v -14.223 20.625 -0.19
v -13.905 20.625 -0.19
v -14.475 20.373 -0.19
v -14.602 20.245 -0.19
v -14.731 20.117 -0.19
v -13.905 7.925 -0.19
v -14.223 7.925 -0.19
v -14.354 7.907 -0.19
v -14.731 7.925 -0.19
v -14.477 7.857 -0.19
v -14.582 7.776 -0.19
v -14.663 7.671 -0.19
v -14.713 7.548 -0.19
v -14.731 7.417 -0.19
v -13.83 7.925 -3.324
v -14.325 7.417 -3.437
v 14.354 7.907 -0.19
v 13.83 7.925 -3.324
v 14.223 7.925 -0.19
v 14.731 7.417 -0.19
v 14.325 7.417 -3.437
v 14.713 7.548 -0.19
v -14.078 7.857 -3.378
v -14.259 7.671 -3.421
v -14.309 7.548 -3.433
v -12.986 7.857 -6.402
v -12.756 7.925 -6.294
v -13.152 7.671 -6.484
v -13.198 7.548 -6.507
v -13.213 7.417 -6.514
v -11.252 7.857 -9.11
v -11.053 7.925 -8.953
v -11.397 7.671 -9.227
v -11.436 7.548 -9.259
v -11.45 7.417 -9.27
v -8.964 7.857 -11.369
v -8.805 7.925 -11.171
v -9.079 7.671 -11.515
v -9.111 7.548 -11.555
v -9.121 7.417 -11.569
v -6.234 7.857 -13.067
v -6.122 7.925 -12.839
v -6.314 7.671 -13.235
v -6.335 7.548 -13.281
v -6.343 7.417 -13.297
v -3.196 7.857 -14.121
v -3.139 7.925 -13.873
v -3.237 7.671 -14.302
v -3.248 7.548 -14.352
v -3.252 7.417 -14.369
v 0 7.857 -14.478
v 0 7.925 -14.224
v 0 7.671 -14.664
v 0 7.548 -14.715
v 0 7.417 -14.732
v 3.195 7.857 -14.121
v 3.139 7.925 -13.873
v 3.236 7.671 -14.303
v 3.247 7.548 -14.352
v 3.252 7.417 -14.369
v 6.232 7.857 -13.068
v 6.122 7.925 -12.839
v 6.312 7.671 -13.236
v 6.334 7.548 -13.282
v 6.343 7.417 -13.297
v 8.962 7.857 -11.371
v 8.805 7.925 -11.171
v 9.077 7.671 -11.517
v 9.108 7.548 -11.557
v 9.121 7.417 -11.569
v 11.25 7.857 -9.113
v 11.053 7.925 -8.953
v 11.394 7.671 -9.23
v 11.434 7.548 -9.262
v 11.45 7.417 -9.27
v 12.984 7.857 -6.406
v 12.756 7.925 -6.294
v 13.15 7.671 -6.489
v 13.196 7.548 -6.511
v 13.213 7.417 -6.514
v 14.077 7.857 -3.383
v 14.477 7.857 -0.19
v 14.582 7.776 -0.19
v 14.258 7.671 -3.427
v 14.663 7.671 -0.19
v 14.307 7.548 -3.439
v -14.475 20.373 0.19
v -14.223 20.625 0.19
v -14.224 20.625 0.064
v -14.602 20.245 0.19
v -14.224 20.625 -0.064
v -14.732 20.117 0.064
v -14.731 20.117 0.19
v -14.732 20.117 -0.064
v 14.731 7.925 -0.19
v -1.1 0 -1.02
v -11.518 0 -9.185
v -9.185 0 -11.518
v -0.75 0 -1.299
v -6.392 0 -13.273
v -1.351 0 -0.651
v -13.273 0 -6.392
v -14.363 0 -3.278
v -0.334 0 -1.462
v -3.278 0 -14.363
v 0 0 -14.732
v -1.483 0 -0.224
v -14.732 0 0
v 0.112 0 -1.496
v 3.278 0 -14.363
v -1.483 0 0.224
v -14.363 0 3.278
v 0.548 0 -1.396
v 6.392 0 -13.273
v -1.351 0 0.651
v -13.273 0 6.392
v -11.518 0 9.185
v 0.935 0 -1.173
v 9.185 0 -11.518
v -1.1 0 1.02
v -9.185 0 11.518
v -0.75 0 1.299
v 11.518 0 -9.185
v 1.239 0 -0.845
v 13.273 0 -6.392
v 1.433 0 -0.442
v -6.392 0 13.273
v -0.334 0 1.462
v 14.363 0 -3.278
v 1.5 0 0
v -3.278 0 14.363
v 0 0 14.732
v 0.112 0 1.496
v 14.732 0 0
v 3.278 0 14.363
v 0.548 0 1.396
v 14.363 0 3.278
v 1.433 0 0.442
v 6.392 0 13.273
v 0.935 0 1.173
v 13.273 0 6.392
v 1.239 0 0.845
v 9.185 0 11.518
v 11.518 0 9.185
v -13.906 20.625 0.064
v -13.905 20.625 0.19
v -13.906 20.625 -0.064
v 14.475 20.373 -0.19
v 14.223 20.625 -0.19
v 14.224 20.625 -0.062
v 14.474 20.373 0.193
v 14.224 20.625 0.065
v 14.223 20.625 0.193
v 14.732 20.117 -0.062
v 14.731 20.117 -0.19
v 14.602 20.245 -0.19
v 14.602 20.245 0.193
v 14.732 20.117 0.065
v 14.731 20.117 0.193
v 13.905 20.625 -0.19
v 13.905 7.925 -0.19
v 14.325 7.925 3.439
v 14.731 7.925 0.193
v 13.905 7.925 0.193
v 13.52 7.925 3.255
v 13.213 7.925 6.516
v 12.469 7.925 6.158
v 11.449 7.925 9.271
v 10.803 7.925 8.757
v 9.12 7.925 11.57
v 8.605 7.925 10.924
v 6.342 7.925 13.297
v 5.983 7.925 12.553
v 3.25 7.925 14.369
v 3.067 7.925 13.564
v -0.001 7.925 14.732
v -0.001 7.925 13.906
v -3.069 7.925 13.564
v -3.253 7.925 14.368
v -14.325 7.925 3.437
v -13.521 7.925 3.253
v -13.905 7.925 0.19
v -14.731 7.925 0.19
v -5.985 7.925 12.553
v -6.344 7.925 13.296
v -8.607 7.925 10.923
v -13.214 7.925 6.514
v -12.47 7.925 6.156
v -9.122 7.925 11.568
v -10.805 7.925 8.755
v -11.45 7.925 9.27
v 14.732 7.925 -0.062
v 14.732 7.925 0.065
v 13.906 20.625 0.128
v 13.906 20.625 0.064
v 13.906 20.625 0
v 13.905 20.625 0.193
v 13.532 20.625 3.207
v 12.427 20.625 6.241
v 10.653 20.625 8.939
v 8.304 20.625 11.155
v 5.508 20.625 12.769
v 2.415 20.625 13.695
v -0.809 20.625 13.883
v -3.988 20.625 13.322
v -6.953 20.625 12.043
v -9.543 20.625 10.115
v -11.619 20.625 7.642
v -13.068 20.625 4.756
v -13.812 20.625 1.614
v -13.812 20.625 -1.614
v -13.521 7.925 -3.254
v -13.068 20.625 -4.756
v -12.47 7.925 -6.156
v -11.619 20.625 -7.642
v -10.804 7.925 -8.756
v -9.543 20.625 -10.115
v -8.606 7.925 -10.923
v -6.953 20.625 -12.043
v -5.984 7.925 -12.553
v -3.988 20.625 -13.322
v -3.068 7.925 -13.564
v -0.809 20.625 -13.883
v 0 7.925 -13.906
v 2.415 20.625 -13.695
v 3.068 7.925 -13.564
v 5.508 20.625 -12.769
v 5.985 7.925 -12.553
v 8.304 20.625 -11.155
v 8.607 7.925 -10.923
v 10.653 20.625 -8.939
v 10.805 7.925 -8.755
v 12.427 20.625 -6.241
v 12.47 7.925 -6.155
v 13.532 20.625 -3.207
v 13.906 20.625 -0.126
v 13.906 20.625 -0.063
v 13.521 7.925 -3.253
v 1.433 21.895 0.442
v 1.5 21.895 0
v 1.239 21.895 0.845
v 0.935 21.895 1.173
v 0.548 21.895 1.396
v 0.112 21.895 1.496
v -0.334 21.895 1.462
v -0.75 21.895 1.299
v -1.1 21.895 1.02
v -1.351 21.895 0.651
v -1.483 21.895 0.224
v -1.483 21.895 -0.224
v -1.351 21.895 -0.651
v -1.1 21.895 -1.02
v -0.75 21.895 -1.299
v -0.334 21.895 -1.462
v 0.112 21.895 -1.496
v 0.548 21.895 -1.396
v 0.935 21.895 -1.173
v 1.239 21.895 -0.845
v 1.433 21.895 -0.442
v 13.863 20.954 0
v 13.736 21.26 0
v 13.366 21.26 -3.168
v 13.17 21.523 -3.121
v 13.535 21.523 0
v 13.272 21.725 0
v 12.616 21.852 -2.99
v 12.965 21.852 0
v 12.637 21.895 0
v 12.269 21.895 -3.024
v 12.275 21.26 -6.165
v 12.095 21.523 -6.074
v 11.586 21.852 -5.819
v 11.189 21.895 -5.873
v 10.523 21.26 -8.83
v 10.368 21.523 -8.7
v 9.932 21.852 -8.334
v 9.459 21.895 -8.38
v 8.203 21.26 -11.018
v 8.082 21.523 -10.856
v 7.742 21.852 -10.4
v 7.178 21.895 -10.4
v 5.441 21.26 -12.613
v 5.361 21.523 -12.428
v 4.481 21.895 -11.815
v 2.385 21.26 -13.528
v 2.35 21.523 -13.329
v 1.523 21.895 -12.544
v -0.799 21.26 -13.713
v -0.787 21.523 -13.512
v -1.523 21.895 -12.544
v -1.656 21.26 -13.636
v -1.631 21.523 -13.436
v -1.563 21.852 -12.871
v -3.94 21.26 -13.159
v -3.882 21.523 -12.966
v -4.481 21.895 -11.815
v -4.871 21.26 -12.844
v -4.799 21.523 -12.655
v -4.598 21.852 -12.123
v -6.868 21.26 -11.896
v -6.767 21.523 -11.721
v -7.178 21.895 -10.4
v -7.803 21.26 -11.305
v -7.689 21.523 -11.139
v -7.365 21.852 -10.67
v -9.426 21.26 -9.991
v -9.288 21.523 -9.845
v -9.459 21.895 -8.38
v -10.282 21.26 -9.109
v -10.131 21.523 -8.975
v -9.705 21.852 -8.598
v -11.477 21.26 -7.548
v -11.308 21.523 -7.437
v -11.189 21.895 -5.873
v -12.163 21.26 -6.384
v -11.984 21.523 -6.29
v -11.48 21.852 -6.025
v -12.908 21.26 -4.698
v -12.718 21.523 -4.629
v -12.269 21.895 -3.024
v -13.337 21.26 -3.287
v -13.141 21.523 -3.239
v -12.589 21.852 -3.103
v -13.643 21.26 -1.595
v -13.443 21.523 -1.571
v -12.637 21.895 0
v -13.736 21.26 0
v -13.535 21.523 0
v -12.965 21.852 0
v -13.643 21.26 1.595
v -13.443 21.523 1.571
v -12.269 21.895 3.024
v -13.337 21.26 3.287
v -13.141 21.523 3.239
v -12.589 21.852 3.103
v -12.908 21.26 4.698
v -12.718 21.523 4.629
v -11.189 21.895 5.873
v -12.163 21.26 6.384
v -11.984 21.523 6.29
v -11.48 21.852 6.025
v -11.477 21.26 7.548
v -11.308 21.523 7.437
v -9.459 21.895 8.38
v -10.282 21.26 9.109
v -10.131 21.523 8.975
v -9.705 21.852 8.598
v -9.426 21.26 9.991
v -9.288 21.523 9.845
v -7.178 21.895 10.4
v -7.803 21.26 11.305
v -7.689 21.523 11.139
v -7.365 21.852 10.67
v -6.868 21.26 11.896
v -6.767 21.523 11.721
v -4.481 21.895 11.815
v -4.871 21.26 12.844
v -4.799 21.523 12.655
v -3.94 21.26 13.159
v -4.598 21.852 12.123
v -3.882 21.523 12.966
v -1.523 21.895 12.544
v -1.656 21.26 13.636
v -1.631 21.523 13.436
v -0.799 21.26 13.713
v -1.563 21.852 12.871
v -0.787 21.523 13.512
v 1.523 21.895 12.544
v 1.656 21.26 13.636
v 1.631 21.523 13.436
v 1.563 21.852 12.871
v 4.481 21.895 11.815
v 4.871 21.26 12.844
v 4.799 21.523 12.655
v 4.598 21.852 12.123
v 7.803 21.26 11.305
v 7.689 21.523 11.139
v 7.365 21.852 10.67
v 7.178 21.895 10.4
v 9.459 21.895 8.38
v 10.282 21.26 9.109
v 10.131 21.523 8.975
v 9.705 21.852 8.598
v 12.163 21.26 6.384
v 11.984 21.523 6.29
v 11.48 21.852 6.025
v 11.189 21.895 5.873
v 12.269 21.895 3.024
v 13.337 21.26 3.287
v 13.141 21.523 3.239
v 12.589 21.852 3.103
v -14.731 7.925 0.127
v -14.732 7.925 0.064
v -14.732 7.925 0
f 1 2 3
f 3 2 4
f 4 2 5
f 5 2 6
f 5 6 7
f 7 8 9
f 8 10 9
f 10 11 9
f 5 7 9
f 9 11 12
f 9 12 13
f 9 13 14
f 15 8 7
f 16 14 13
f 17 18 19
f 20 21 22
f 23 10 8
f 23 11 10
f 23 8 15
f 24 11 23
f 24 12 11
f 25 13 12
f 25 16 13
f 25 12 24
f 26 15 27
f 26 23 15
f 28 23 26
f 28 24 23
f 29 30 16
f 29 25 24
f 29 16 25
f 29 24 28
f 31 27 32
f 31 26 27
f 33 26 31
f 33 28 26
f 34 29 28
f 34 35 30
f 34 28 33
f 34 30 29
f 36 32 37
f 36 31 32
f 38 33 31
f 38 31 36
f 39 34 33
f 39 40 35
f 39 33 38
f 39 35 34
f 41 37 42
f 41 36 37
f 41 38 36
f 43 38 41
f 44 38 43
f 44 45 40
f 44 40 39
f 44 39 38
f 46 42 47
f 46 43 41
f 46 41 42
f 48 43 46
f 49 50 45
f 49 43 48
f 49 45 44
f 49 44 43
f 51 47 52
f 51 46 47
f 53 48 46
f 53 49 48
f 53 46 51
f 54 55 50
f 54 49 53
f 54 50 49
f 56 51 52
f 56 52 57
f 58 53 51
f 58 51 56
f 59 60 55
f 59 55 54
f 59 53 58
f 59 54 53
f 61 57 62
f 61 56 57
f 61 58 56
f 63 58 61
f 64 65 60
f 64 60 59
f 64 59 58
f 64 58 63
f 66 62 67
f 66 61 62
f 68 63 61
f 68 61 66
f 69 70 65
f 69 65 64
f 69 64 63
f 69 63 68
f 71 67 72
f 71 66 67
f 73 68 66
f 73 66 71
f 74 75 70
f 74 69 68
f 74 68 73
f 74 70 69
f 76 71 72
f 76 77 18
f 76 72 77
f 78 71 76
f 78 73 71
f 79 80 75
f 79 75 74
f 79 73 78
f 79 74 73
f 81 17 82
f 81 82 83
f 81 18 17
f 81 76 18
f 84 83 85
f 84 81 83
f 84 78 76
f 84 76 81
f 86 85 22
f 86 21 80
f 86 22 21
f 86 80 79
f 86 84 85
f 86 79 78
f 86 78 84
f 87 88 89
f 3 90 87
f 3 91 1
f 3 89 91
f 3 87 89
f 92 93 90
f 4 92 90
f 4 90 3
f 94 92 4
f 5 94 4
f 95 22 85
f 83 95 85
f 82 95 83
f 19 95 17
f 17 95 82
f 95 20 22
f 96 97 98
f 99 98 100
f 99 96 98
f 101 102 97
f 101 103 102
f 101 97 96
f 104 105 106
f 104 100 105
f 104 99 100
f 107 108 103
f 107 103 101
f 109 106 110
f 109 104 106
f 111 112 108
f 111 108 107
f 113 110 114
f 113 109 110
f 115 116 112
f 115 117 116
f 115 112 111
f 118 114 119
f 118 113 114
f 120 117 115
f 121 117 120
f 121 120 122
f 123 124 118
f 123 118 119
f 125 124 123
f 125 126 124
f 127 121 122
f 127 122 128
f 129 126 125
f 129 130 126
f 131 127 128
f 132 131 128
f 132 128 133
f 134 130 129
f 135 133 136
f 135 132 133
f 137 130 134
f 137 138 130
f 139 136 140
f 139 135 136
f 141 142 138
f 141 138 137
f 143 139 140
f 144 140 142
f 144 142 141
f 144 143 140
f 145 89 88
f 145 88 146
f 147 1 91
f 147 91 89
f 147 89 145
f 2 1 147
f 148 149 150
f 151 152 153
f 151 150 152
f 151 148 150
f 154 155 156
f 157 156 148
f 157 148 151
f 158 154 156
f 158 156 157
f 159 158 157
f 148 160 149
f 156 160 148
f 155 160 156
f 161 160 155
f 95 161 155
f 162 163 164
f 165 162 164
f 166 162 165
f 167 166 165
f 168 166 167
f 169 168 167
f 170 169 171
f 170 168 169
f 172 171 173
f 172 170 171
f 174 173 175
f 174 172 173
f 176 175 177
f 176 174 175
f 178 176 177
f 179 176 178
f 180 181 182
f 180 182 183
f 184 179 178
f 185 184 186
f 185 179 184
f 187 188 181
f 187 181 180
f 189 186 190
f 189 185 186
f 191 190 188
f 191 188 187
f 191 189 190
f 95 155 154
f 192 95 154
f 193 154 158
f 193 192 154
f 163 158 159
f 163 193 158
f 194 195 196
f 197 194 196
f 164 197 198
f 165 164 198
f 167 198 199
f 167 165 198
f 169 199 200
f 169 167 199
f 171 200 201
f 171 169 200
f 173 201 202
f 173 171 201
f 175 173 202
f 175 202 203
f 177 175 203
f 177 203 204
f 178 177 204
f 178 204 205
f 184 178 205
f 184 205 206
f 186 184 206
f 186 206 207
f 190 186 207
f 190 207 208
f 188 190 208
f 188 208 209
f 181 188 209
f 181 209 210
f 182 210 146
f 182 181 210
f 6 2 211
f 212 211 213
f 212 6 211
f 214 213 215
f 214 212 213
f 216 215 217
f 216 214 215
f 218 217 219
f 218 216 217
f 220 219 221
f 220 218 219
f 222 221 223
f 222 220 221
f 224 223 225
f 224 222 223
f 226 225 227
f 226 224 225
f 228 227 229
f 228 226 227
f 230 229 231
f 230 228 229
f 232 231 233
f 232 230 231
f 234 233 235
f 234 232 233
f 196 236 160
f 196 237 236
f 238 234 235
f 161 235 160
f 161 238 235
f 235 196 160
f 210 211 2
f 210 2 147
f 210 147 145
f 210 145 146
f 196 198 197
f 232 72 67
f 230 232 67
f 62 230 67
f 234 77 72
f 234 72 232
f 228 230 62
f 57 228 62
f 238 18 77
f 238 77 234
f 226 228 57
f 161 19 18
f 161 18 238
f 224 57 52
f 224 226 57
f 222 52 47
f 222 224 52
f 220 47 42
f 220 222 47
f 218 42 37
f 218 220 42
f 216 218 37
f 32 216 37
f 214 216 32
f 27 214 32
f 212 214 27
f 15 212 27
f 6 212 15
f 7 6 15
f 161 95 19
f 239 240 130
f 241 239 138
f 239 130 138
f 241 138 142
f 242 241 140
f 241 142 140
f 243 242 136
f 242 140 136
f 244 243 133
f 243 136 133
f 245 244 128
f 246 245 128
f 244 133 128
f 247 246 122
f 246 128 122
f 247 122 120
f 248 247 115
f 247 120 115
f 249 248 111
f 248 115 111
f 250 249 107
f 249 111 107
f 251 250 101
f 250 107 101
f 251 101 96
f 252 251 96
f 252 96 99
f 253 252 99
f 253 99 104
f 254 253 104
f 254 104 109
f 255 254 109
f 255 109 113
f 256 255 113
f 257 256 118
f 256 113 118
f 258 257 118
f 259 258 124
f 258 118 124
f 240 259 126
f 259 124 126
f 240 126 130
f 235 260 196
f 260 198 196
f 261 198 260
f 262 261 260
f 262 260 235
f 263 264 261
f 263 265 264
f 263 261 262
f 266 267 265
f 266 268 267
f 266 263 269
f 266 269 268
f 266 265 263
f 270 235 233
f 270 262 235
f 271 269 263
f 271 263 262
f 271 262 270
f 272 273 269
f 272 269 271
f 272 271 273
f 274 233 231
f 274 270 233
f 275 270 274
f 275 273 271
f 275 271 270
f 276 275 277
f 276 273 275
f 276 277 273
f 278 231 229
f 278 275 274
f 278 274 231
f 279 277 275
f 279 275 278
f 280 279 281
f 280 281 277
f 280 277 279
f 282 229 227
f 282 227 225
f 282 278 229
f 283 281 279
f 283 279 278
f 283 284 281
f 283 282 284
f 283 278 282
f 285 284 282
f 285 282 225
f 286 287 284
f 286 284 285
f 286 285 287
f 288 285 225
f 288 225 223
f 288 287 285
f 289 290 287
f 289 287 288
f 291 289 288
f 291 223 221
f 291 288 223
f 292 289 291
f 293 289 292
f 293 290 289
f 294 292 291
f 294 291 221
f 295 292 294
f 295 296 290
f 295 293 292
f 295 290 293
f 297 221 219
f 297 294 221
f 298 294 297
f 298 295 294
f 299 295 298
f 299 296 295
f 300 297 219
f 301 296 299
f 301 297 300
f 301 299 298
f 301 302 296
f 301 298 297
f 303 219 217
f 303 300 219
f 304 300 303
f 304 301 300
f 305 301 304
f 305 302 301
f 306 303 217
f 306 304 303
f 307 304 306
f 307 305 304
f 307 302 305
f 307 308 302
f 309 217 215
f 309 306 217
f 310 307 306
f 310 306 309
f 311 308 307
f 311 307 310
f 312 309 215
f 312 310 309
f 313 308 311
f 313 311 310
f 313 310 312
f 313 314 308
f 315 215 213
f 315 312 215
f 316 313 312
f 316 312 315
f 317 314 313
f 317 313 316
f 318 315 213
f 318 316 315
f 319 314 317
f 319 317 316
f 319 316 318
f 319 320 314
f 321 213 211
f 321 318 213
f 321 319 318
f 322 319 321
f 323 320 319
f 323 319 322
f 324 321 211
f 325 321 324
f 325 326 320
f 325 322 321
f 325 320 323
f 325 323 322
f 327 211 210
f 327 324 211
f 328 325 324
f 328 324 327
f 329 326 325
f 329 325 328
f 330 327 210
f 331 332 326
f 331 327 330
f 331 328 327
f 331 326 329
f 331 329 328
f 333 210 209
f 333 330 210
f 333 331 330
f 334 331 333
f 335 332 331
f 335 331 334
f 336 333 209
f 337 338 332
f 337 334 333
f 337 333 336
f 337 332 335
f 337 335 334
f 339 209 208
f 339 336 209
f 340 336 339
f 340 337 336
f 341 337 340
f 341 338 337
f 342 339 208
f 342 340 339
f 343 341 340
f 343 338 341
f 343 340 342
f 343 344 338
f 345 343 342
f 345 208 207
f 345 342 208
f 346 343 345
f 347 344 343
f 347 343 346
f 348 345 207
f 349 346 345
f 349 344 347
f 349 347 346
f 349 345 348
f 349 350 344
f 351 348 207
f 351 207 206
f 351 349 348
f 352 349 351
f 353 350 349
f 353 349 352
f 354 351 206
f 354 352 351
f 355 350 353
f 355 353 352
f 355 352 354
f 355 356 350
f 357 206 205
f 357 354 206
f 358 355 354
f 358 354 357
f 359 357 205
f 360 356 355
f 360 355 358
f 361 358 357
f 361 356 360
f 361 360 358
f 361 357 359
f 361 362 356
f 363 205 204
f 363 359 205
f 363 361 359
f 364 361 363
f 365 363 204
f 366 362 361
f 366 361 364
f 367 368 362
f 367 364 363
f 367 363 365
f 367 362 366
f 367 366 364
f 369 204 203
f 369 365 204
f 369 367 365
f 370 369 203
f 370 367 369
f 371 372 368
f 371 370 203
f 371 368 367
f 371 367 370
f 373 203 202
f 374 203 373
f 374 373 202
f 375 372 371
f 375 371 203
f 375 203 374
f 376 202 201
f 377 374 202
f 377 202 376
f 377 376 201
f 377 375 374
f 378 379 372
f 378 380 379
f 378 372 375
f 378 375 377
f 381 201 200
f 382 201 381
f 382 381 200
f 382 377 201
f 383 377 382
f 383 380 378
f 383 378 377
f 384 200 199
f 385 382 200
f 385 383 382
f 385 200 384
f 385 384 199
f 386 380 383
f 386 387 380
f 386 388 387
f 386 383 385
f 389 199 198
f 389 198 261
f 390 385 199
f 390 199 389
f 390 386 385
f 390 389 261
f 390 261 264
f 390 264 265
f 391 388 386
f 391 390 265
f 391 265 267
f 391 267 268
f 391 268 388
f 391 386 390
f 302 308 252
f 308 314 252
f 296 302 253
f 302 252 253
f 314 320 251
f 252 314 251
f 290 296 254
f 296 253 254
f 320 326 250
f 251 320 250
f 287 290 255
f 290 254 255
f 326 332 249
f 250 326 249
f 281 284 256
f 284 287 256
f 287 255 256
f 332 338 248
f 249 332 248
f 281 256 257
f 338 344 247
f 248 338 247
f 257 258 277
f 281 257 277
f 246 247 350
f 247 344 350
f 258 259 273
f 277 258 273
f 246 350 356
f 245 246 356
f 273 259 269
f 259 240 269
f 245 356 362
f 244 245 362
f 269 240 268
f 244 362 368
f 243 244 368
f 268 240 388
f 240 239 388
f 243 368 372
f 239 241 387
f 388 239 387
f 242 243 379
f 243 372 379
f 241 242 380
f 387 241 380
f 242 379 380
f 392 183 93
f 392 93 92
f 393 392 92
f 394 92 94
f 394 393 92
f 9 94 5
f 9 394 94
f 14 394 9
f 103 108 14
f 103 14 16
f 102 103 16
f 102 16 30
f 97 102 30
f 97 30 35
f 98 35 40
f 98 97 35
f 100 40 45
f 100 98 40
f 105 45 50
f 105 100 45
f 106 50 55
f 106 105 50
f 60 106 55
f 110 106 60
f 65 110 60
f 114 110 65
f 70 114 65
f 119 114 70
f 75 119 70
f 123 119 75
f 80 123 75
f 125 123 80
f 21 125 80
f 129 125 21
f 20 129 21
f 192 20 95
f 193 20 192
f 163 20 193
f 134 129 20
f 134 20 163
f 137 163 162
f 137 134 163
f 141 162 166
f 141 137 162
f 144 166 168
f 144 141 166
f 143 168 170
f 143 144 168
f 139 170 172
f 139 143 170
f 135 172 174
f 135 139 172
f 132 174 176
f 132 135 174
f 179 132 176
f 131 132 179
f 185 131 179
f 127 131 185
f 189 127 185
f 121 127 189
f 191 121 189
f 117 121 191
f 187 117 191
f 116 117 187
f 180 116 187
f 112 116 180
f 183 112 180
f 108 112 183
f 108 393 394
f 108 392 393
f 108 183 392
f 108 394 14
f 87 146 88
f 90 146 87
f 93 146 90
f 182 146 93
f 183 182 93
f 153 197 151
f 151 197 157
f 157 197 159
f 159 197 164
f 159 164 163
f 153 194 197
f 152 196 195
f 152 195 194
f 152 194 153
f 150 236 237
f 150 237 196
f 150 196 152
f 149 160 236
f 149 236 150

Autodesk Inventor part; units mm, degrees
ref_plane "YZ Plane" through (0, 0, 0) normal (1, 0, 0) x (0, 1, 0)
ref_plane "XZ Plane" through (0, 0, 0) normal (0, 1, 0) x (-1, 0, 0)
ref_plane "XY Plane" through (0, 0, 0) normal (0, 0, 1) x (1, 0, 0)
sketch "Sketch1" plane through (0, 0, 0) normal (0, 1, 0) x (-1, 0, 0)
  circle A0 centre (0, 0) radius 14.732
  dimension "d0" = 29.464
extrude "Extrusion1" add sketch "Sketch1" along normal blind 7.9248
sketch "Sketch2" plane through (0, 7.9248, 0) normal (0, 1, 0) x (1, 0, 0)
  circle A0 centre (0, 0) radius 14.732 projected
  circle A1 centre (0, 0) radius 13.9065
  dimension "d3" = 27.813
extrude "Extrusion2" add sketch "Sketch2" along normal blind 13.97 contours A1
sketch "Sketch4" plane through (0, 7.9248, 0) normal (0, 1, 0) x (1, 0, 0)
  circle A0 centre (0, 0) radius 13.9065 projected
  circle A1 centre (0, 0) radius 14.732 projected
  circle A2 centre (0, 0) radius 13.9065
  circle A3 centre (0, 0) radius 14.732
  line L0 (-13.905, 0.2046) -> (-13.0794, 0.2046) construction
  line L1 (-13.9052, 0.1905) -> (-14.7308, 0.1905)
  line L2 (-13.9052, 0.1905) -> (-13.0796, 0.1905) construction
  line L3 (-13.9052, -0.1905) -> (-14.7308, -0.1905)
  line L4 (-13.9052, -0.1905) -> (-13.0796, -0.1905) construction
  line L5 (-13.9052, 0.1905) -> (14.7308, 0.1896)
  line L6 (-13.9052, -0.1905) -> (14.7307, -0.1927)
  dimension "d7" = 180
  dimension "d8" = 180
extrude "Extrusion3" add sketch "Sketch4" along normal blind 12.7 contours L5 A0 L6 | A0 L3 A1 L1 | L5 A1 L6 A0
chamfer "Chamfer1" distance 0.508 angle 45 1 edges at (14.732, 20.6248, 0.0015)
chamfer "Chamfer2" distance 0.508 angle 45 1 edges at (-14.732, 20.6248, 0)
fillet "Fillet1" radius 1.27 1 edges at (-13.9065, 21.8948, 0)
fillet "Fillet2" radius 0.508 1 edges at (0.0004, 7.9248, -14.732)
sketch "Sketch5" plane through (0, 21.8948, 0) normal (0, 1, 0) x (1, 0, 0)
  circle A0 centre (0, 0) radius 12.6365 projected
  circle A1 centre (0, 0) radius 7.9375
  dimension "d19" = 15.875
extrude "Extrusion4" cut sketch "Sketch5" against normal blind 25.4 contours A1
sketch "Sketch6" plane through (0, 0, 0) normal (0, -1, 0) x (1, 0, 0)
  circle A0 centre (0, 0) radius 7.9375 projected
  circle A1 centre (0, 0) radius 14.732 projected
  circle A2 centre (0, 0) radius 7.9375
  circle A3 centre (0, 0) radius 1.5
  dimension "d22" = 3
extrude "Extrusion5" add sketch "Sketch6" against normal blind 21.8948 contours A0
properties part number "Pipe Cap 3 - Kapton Tape"
